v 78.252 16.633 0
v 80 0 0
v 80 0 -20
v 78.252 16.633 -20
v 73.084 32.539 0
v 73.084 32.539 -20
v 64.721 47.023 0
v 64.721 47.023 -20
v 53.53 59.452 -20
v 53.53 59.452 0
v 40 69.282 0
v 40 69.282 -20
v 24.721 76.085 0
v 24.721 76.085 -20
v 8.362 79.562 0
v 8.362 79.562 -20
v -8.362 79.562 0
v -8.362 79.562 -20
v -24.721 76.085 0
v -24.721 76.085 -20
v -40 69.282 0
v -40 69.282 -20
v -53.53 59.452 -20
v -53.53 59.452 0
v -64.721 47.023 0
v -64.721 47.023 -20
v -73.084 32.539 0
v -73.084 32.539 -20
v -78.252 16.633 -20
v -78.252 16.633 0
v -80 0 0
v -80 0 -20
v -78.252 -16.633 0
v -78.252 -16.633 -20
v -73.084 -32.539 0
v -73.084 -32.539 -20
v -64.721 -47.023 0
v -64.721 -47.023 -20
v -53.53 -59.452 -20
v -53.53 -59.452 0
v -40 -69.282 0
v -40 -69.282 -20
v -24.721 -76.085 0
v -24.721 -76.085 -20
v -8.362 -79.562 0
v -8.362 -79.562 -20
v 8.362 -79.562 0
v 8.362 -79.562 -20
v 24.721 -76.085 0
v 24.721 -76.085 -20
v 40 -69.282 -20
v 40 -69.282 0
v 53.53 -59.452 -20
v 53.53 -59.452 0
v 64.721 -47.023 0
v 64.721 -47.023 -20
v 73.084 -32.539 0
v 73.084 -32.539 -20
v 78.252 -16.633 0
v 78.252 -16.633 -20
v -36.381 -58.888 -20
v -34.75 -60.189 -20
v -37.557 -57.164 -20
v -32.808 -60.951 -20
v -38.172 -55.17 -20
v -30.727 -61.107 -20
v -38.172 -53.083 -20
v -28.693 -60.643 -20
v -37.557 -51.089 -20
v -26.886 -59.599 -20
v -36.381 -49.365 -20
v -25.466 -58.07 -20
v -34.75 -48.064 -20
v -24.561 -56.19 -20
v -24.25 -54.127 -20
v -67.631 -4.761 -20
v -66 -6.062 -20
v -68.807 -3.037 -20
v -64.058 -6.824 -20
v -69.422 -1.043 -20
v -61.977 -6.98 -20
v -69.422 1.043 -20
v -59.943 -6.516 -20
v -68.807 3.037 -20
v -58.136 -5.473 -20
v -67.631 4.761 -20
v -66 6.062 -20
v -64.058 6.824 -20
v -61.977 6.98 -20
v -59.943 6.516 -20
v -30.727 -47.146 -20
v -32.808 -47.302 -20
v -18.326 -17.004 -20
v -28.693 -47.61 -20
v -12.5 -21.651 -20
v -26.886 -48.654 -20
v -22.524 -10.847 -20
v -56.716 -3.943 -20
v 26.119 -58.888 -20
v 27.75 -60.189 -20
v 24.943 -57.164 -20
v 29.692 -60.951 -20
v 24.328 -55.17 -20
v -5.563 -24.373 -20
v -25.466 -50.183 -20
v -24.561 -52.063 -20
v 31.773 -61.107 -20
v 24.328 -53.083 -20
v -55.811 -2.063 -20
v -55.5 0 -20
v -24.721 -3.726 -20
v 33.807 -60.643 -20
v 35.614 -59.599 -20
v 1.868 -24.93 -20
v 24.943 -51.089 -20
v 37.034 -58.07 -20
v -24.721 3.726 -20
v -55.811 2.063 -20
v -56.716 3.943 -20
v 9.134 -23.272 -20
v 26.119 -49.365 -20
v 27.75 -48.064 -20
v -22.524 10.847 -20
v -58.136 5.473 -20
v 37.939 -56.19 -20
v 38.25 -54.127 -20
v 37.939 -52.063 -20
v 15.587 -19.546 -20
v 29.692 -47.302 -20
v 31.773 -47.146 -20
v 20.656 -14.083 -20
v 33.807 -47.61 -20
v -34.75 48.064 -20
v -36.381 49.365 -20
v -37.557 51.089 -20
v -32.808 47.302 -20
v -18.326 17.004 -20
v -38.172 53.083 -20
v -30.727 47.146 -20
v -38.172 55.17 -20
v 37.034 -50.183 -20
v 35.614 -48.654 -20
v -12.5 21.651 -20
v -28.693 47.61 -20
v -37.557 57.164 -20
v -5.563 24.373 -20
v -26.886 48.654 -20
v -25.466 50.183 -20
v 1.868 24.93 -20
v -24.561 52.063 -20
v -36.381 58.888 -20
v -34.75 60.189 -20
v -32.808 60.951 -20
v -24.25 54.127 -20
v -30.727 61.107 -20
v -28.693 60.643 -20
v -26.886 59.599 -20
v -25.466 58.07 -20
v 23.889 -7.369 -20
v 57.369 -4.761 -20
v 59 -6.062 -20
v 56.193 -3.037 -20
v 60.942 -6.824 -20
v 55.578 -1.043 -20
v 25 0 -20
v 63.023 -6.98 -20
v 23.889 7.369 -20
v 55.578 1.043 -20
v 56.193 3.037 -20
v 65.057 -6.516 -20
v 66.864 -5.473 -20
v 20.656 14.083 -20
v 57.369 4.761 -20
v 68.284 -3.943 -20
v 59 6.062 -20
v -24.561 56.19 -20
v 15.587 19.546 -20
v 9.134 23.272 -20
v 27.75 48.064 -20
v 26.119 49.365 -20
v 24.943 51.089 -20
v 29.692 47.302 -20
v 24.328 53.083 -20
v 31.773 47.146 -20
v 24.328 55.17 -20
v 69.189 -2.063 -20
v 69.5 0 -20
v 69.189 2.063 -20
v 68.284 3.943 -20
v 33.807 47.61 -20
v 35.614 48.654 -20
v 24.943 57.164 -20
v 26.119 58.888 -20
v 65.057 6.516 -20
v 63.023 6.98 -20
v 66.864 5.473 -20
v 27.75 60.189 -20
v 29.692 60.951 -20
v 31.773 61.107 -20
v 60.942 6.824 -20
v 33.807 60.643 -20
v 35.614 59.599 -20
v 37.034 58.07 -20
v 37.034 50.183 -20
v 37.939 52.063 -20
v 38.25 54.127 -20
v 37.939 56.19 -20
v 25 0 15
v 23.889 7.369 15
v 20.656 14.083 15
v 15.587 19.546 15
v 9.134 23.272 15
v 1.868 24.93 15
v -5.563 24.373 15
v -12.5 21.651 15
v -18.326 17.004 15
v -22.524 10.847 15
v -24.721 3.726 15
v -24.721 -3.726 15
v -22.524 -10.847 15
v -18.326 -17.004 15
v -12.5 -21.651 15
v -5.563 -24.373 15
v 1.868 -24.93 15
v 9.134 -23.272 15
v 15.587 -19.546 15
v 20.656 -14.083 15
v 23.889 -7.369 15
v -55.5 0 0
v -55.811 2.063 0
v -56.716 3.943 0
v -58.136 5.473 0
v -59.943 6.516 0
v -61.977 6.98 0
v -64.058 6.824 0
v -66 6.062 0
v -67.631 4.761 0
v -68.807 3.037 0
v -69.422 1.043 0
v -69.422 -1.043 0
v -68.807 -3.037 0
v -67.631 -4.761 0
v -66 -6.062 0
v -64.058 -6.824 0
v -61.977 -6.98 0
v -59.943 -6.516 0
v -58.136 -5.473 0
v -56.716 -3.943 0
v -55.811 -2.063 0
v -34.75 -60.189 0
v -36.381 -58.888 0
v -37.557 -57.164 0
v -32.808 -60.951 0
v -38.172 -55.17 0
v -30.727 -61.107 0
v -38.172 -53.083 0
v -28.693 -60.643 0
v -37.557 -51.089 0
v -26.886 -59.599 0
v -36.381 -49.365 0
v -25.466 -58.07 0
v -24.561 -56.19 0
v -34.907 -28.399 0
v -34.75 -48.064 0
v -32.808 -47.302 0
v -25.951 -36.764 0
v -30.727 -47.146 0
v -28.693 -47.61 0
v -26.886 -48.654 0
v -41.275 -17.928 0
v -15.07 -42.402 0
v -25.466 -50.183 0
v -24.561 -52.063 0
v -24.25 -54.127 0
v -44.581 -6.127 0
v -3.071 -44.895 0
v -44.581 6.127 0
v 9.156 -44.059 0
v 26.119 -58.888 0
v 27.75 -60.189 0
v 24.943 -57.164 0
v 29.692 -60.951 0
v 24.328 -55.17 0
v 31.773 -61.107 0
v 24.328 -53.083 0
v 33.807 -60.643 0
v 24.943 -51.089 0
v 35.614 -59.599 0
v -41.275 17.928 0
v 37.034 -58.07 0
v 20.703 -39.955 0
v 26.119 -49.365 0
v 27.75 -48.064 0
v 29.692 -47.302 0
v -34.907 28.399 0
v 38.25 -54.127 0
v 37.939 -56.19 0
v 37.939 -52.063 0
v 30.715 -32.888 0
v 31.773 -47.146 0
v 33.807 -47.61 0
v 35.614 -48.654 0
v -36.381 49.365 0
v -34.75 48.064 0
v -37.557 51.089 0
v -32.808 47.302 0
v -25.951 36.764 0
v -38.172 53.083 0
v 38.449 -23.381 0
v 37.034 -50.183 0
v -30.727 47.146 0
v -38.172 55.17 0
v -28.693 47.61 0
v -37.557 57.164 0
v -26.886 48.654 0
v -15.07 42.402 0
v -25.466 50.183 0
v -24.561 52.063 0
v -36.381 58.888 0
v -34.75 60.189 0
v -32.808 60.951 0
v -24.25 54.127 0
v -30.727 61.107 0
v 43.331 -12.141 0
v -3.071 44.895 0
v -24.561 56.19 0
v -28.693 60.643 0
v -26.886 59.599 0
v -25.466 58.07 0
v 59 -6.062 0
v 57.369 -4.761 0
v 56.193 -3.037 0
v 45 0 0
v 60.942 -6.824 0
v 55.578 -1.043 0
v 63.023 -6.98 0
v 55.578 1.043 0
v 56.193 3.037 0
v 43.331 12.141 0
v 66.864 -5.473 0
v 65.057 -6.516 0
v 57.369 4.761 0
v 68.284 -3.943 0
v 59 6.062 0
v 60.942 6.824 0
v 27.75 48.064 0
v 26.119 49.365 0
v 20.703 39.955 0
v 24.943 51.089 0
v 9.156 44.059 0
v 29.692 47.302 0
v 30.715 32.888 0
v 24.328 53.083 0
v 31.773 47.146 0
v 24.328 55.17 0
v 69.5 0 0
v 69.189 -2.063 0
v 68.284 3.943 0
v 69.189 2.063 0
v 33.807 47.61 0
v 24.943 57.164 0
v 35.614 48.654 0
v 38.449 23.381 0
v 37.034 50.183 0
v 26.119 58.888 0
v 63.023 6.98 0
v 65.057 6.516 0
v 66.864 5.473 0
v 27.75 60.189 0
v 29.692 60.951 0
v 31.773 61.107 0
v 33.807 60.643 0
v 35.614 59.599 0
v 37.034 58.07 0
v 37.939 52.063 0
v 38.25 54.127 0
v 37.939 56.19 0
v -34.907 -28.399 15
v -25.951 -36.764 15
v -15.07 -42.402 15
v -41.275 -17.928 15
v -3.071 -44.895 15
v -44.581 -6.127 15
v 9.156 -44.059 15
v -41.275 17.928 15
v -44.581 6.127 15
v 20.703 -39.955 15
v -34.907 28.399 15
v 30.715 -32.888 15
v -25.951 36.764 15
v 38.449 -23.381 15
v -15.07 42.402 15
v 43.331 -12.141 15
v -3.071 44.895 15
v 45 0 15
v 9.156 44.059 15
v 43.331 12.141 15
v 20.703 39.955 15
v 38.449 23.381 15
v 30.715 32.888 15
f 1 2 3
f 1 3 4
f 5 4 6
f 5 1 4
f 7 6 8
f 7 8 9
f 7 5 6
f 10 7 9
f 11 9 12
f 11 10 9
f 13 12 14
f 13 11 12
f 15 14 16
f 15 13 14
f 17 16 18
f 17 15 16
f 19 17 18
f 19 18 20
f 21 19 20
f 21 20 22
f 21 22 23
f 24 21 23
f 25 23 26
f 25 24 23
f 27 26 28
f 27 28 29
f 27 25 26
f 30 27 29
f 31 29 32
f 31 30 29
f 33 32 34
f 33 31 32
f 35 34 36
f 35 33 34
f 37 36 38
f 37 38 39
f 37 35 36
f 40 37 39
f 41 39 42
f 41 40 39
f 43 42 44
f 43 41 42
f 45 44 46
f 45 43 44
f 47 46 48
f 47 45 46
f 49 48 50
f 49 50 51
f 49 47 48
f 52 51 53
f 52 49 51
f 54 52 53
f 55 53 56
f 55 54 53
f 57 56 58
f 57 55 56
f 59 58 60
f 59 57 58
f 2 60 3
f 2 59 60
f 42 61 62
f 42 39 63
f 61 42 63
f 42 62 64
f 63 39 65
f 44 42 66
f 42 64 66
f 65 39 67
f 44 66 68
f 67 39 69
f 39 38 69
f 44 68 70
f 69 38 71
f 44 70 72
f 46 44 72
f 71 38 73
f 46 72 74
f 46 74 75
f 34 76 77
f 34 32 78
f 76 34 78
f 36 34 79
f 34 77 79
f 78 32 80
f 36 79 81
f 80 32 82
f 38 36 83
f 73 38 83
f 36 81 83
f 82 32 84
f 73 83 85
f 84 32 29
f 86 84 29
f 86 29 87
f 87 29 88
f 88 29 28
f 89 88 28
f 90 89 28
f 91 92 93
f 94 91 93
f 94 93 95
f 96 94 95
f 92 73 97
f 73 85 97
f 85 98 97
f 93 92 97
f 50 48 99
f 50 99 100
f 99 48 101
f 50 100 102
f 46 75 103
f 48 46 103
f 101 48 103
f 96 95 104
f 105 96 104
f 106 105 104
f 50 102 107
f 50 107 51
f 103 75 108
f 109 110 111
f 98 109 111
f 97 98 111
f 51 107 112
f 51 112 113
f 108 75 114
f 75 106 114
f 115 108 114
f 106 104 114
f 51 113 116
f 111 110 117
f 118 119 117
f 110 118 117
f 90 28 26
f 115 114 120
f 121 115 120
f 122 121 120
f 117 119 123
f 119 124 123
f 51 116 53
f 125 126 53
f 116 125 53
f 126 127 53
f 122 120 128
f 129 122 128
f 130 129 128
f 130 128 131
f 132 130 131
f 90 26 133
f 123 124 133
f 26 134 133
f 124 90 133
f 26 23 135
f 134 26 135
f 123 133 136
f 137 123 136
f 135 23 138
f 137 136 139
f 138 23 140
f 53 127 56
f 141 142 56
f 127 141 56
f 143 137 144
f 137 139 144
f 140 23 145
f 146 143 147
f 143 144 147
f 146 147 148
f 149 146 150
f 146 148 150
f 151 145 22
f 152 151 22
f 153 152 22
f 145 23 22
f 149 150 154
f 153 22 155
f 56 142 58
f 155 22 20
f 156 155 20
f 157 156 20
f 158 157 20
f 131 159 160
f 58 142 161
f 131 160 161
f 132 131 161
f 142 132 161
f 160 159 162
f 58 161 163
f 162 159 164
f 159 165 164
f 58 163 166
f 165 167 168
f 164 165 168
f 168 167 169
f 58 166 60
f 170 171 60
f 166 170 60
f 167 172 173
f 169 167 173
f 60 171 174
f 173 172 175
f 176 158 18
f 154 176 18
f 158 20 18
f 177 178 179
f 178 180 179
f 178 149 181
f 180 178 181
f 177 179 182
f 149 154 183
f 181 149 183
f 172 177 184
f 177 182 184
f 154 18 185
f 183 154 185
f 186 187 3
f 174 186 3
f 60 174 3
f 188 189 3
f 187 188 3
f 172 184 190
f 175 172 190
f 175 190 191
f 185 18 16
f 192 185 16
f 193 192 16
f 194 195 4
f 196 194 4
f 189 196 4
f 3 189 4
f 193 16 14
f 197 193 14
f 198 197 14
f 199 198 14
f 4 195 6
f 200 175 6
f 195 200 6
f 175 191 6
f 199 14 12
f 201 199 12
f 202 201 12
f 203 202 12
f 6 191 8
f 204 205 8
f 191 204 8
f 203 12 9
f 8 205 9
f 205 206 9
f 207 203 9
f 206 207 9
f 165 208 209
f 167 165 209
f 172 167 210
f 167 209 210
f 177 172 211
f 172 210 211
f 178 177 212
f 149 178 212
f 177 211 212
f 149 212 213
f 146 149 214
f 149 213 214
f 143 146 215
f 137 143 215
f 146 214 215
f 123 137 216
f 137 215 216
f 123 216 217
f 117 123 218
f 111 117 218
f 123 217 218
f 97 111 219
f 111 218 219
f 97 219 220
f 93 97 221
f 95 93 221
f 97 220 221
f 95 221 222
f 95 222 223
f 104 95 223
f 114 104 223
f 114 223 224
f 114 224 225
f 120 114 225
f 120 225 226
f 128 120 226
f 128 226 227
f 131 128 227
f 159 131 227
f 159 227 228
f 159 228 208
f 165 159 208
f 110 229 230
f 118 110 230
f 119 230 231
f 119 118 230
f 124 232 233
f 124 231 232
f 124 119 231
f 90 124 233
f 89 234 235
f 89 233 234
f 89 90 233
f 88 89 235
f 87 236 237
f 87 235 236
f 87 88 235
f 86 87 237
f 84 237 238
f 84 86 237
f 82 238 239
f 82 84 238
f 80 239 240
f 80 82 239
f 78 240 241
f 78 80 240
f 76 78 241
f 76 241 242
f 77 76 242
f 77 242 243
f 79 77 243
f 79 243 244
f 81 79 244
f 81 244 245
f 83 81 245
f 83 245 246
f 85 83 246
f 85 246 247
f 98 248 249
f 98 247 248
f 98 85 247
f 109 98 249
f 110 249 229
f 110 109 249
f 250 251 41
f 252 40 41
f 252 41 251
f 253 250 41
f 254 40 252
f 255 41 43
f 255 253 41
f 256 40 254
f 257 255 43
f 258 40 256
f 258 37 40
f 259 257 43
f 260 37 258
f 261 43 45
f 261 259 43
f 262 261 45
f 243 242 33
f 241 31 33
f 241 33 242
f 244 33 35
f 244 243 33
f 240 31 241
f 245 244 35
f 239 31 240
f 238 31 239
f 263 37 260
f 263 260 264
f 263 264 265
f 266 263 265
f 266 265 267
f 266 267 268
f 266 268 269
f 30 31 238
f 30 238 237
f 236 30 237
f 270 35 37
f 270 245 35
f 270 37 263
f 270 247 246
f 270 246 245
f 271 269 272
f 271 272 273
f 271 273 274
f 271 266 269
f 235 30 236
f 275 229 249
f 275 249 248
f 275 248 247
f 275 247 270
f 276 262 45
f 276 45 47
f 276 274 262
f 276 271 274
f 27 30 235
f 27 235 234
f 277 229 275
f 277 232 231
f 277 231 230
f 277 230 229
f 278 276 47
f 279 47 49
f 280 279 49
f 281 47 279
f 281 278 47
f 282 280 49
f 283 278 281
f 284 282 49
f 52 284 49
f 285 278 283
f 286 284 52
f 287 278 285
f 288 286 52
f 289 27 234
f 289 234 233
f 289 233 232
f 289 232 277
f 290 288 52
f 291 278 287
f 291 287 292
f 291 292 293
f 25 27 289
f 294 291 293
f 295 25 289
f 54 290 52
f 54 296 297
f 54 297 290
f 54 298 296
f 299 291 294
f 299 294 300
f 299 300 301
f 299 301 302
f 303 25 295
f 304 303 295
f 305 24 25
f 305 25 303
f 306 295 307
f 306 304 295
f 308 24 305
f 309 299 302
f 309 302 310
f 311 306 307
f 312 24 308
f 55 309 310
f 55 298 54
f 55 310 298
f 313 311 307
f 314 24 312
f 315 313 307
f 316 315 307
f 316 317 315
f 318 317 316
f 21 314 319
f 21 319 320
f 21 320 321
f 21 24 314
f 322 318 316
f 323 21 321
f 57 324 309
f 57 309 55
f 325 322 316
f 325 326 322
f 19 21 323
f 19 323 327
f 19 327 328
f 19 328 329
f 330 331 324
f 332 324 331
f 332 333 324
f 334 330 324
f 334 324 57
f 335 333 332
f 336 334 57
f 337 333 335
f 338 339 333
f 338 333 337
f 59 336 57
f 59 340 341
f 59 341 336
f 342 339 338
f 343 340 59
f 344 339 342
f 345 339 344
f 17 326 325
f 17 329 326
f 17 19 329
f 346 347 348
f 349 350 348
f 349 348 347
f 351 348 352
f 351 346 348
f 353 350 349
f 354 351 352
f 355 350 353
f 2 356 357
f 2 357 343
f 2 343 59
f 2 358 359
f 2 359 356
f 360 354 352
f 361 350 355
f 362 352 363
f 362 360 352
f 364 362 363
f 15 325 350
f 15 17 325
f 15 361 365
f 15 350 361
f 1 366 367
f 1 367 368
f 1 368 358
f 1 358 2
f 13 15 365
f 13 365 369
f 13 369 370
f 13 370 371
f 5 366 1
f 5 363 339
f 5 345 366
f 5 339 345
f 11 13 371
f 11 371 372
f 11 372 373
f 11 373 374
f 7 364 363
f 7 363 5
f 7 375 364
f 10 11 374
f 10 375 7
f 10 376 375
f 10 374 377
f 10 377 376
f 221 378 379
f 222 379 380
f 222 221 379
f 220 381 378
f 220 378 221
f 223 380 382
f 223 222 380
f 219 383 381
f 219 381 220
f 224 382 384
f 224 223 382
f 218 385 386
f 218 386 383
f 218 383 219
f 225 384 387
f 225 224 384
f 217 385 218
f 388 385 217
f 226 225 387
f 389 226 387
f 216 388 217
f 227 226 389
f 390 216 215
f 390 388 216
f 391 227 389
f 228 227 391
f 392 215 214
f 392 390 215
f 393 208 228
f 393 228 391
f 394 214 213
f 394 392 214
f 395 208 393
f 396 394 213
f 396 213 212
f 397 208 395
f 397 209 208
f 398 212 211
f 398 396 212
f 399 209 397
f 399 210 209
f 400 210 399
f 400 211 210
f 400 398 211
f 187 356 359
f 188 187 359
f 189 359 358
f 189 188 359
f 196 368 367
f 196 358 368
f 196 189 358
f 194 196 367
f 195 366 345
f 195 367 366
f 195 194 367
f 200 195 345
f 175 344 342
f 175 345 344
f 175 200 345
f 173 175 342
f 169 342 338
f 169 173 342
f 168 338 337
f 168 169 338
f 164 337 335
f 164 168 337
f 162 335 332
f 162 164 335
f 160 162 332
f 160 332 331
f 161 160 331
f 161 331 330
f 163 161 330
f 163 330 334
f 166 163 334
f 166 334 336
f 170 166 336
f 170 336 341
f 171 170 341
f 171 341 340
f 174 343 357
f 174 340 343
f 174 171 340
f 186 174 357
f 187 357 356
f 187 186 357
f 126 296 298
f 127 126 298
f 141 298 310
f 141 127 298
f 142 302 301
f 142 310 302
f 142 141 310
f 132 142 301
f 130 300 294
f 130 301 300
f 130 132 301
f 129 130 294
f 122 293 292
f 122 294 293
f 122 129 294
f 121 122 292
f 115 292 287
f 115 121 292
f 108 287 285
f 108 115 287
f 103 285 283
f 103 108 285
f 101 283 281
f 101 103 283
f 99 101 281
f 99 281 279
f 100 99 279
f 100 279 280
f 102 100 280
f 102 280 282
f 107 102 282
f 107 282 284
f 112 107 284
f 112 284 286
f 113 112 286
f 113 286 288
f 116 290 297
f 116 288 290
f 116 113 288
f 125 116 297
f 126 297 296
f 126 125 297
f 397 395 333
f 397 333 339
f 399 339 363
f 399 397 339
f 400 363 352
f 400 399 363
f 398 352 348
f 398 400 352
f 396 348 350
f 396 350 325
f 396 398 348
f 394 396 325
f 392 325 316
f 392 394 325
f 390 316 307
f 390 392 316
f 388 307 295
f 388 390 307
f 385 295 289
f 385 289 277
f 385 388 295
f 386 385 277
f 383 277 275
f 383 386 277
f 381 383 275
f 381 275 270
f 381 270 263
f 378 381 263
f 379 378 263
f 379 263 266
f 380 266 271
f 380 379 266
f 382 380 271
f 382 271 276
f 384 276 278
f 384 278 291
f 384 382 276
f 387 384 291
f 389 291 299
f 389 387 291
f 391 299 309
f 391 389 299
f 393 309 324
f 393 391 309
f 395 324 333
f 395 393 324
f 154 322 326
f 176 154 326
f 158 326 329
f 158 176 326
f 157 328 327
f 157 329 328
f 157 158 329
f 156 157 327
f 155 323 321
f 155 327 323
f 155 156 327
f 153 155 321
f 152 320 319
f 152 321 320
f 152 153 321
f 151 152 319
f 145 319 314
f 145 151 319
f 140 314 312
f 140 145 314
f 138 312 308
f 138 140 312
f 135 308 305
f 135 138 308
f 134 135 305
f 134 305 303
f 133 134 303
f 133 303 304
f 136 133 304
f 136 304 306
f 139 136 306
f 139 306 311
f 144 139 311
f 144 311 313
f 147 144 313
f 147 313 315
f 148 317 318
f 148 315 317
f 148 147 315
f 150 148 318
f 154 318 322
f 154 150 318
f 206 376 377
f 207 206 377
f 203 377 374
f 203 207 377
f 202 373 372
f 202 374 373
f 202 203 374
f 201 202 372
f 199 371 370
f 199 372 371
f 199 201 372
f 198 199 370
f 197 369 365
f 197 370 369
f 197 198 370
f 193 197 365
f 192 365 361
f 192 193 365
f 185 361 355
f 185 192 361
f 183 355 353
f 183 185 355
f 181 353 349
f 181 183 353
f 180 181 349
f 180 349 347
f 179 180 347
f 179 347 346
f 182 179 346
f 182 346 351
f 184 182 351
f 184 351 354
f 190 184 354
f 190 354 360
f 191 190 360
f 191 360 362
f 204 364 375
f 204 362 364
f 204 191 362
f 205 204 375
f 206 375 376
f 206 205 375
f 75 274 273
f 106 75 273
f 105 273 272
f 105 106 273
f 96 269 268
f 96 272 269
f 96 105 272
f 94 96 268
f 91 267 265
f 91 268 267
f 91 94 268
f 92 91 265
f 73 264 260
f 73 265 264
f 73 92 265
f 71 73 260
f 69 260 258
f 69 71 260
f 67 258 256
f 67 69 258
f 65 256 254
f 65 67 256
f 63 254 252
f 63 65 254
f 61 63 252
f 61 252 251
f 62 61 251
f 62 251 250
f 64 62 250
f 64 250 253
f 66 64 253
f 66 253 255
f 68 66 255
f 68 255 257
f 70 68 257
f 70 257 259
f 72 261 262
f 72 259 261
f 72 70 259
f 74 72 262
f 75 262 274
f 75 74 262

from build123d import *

# Parameters (mm, degrees)
SKETCH_1_R               = 80
SKETCH_1_R_2             = 25
EXTRUDE_1_DEPTH          = 20
EXTRUDE_START            = 15
SKETCH_2_R               = 45
SKETCH_2_R_2             = 25
EXTRUDE_2_DEPTH          = 15
CUT_EXTRUDE_1_DEPTH      = 115.891252931
CUT_EXTRUDE_1_DEPTH_BACK = 115.891252931
SKETCH_3_R               = 7


with BuildPart() as part:
    # 草图1 → 凸台-拉伸1 (new body)
    with BuildSketch(Plane.XY):
        Circle(SKETCH_1_R)
        Circle(SKETCH_1_R_2, mode=Mode.SUBTRACT)
    extrude(amount=-EXTRUDE_1_DEPTH)

    # 草图2 → 凸台-拉伸2 (add)
    with BuildSketch(Plane.XY.offset(EXTRUDE_START)):
        Circle(SKETCH_2_R)
        Circle(SKETCH_2_R_2, mode=Mode.SUBTRACT)
    extrude(amount=-EXTRUDE_2_DEPTH)

    # 草图3 → 切除-拉伸1 (cut, two sides: drawn at the far end of the back side and taken through both)
    with BuildSketch(Plane.XY.offset(-CUT_EXTRUDE_1_DEPTH_BACK)):
        with Locations((62.5, 0)):
            Circle(SKETCH_3_R)
        with Locations((31.25, 54.126587737)):
            Circle(SKETCH_3_R)
        with Locations((-31.25, 54.126587737)):
            Circle(SKETCH_3_R)
        with Locations((-62.5, 0)):
            Circle(SKETCH_3_R)
        with Locations((-31.25, -54.126587737)):
            Circle(SKETCH_3_R)
        with Locations((31.25, -54.126587737)):
            Circle(SKETCH_3_R)
    extrude(amount=CUT_EXTRUDE_1_DEPTH + CUT_EXTRUDE_1_DEPTH_BACK, mode=Mode.SUBTRACT)


solid = part.part
